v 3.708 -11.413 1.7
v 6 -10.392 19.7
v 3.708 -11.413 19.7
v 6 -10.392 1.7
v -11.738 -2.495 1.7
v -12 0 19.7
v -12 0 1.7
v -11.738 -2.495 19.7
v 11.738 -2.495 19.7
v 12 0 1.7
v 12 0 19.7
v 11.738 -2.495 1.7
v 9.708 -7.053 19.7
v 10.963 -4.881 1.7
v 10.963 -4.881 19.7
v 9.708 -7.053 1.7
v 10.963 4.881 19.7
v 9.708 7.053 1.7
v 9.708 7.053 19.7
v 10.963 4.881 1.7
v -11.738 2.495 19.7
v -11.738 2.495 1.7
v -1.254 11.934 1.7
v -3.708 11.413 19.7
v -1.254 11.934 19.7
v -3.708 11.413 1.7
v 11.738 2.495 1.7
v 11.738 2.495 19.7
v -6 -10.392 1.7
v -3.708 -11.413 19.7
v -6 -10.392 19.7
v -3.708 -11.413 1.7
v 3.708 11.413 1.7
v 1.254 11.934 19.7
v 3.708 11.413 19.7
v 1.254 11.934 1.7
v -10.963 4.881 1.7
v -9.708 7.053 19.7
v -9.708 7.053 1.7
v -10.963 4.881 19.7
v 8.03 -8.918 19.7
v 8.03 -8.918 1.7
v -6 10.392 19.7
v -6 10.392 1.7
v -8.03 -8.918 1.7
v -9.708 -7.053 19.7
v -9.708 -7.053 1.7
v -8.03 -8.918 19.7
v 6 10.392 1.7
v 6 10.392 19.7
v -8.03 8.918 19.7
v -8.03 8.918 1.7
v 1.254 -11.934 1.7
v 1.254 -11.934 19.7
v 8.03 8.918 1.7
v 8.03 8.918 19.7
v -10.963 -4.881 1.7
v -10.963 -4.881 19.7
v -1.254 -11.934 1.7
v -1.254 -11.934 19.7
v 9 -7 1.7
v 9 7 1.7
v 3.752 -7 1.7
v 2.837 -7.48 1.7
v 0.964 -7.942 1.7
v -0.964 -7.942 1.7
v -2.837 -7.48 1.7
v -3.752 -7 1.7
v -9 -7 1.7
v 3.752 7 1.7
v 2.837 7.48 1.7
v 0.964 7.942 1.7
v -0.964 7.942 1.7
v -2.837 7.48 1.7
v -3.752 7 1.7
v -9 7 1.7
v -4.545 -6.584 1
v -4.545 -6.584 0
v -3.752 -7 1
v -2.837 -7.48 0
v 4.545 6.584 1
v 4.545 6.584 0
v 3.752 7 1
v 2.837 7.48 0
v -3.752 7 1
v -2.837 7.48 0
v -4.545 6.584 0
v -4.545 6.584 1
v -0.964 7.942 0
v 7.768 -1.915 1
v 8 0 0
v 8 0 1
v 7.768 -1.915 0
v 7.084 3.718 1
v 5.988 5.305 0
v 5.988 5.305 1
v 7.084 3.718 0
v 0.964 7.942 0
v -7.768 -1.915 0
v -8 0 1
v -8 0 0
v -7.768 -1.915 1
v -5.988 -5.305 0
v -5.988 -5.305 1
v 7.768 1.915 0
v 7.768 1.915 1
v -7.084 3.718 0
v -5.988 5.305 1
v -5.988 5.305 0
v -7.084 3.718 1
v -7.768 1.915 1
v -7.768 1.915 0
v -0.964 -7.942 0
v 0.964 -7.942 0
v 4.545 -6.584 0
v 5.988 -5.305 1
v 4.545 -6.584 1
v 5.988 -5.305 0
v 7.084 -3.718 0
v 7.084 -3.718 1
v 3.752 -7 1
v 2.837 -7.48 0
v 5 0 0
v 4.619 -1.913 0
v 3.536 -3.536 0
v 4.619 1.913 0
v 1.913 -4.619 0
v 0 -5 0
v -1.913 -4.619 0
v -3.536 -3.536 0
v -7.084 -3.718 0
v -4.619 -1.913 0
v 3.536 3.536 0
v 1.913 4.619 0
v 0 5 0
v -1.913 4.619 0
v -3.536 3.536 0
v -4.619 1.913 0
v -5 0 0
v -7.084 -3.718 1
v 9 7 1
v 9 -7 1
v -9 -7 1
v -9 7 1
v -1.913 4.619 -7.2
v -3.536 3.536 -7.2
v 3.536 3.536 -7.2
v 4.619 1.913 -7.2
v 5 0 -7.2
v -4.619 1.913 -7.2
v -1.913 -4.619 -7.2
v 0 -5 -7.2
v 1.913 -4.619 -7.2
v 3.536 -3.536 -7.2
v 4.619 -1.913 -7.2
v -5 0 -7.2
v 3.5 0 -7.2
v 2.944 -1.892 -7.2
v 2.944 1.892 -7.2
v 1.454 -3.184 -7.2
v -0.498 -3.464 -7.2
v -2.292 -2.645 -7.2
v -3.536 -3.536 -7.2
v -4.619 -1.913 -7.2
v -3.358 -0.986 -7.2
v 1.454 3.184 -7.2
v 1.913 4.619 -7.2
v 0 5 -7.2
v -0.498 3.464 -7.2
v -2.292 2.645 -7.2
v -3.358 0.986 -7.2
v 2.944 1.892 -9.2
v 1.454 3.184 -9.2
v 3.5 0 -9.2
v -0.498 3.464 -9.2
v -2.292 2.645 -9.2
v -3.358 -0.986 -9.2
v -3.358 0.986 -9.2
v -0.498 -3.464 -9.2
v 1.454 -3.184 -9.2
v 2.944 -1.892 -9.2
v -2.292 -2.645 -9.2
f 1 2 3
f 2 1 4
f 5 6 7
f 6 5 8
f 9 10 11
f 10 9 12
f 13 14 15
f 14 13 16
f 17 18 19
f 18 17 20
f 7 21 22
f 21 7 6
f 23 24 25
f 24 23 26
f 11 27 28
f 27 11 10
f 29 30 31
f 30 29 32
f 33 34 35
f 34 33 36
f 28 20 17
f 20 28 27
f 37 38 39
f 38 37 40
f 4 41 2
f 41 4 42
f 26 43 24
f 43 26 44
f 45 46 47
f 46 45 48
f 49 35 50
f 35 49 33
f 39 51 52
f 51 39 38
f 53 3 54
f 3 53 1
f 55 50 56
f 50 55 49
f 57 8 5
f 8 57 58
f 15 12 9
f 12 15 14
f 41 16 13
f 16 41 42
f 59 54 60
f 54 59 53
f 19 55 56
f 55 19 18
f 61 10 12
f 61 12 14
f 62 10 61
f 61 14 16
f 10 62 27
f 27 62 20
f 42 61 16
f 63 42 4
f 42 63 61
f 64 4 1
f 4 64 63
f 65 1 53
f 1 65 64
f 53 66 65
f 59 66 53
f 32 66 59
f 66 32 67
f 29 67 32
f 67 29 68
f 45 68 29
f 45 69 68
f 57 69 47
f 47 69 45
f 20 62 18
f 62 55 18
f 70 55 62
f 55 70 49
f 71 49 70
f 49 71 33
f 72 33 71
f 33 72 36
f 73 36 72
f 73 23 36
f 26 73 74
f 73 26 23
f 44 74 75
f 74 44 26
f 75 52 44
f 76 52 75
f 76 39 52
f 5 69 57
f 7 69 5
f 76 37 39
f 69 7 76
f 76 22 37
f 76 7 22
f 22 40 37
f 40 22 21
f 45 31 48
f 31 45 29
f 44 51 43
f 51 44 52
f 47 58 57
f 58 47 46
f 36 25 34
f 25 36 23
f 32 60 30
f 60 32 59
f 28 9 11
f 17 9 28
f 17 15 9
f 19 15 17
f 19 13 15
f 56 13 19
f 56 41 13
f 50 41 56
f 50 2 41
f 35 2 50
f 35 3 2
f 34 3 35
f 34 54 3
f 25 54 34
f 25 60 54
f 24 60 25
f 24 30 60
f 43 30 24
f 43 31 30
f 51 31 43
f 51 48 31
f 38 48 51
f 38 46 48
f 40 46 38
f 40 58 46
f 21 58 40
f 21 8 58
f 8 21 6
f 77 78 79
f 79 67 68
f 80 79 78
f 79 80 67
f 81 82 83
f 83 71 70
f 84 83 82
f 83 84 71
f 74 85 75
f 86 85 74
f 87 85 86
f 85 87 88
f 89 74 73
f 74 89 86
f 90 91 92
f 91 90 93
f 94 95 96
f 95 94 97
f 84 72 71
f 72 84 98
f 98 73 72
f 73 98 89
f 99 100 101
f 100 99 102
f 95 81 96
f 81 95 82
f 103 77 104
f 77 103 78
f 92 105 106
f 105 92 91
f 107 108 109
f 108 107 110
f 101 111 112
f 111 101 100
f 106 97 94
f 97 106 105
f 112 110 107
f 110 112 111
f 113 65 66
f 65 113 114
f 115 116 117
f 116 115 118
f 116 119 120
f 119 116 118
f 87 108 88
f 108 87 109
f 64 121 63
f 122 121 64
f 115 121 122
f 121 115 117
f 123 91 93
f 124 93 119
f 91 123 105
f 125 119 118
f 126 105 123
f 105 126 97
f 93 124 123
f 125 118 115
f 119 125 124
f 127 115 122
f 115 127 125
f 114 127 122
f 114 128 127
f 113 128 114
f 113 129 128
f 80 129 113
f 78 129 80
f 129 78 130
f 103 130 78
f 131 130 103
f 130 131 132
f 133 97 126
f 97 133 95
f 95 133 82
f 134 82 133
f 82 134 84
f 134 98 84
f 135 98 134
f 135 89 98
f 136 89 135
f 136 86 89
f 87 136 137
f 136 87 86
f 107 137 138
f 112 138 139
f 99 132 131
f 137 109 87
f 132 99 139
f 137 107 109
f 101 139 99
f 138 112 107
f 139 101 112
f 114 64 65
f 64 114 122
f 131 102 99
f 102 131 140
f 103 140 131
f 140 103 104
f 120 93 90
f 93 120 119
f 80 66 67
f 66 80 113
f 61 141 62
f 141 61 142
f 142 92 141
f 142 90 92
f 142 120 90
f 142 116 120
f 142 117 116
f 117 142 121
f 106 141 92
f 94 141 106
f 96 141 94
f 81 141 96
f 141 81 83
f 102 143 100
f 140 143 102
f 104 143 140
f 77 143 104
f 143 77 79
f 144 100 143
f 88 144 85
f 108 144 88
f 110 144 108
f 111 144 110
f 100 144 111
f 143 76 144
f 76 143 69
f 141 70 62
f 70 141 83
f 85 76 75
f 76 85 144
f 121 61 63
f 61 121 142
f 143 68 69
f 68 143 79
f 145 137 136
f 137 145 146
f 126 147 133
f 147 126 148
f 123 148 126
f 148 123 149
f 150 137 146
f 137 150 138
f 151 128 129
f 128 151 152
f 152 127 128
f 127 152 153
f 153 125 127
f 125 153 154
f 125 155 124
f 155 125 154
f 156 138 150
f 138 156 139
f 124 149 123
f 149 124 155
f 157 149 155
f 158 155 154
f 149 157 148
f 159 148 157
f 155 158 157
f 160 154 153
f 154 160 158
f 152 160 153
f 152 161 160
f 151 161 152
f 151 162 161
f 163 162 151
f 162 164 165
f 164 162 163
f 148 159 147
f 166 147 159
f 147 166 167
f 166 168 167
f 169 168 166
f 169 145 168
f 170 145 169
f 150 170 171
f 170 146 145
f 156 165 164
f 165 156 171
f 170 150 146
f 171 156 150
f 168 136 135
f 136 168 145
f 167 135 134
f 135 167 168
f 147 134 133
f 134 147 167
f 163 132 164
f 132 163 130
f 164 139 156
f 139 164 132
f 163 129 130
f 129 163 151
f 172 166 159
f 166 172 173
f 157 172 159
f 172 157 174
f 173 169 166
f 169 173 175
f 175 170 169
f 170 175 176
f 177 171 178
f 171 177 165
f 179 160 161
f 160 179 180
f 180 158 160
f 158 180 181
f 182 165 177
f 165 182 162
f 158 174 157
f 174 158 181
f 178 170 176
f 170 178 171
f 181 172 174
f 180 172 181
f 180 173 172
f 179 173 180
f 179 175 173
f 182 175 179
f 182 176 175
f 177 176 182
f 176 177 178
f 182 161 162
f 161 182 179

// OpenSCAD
// Parameters
type_0 = 12; //[6:24:1]
type_1 = 11; //[6:22:1]
type_2 = 6; //[3:12:1]
type_3 = 0.5; //[0.25:1:0.05]
thickness = 3; //[1.5:6:0.5]
shaft_length = 18; //[9:36:1]
value_flag = 0; //[0:1:1]
eps = 0.8; //[0.4:1.6:0.1]
body_d = 24; //[12:48:1]
body_total_h = 18; //[9:36:1]
gangs = 1; //[1:3:1]
wafer_h = 2; //[1:4:0.5]
gap_h = 2; //[1:4:0.5]
boss_d = 16; //[8:32:1]
boss_h = 2.5; //[1.25:5:0.25]
face_w = 18; //[9:36:1]
face_h = 14; //[7:28:1]
face_t = 1.5; //[0.75:3:0.25]
thread_d = 10; //[5:20:0.5]
thread_h = 8; //[4:16:0.5]
shaft_d = 6; //[3:12:0.5]
neck_d = 7; //[3.5:14:0.5]
neck_h = 2; //[0:6:0.5]
flat_depth = 1; //[0:2.5:0.25]
spigot_enable = 0; //[0:1:1]
spigot_w = 6; //[3:12:0.5]
spigot_h = 3; //[1.5:6:0.5]
spigot_l = 4; //[2:8:0.5]
spigot_x = 8; //[0:16:0.5]

// Potentiometer - complete geometry
module potentiometer() {
  color("DimGray") {
    // Body sections (gangs)
    translate([0, 0, boss_h + (body_total_h + (gangs - 1) * gap_h) / 2 - eps])
      cylinder(r=body_d/2, h=body_total_h + (gangs - 1) * gap_h, center=true);

    // Wafer (if defined)
    translate([0, 0, boss_h + wafer_h/2 - eps])
      cylinder(r=(body_d/2) * 0.98, h=wafer_h, center=true);

    // Boss
    translate([0, 0, boss_h/2])
      cylinder(r=boss_d/2, h=boss_h, center=true);

    // Faceplate
    translate([0, 0, boss_h - face_t/2])
      cube([face_w, face_h, face_t], center=true);

    // Threaded bushing
    translate([0, 0, -thread_h/2 + eps])
      cylinder(r=thread_d/2, h=thread_h, center=true);

    // Shaft neck
    translate([0, 0, -thread_h - neck_h/2 + eps])
      cylinder(r=neck_d/2, h=neck_h, center=true);

    // Shaft
    difference() {
      translate([0, 0, -thread_h - neck_h - shaft_length/2 + eps])
        cylinder(r=shaft_d/2, h=shaft_length, center=true);
      // Shaft flat cut
      translate([0, shaft_d/2 - flat_depth, -thread_h - neck_h - shaft_length/2 + eps])
        cube([shaft_d*2, shaft_d*2, shaft_length + eps*2], center=true);
    }

    // Spigot (if enabled)
    if (spigot_enable) {
      translate([spigot_x, 0, boss_h + spigot_h/2 - eps])
        cube([spigot_l, spigot_w, spigot_h], center=true);
    }
  }
}

// Assembly
module assembly() {
  potentiometer();
}

assembly();
